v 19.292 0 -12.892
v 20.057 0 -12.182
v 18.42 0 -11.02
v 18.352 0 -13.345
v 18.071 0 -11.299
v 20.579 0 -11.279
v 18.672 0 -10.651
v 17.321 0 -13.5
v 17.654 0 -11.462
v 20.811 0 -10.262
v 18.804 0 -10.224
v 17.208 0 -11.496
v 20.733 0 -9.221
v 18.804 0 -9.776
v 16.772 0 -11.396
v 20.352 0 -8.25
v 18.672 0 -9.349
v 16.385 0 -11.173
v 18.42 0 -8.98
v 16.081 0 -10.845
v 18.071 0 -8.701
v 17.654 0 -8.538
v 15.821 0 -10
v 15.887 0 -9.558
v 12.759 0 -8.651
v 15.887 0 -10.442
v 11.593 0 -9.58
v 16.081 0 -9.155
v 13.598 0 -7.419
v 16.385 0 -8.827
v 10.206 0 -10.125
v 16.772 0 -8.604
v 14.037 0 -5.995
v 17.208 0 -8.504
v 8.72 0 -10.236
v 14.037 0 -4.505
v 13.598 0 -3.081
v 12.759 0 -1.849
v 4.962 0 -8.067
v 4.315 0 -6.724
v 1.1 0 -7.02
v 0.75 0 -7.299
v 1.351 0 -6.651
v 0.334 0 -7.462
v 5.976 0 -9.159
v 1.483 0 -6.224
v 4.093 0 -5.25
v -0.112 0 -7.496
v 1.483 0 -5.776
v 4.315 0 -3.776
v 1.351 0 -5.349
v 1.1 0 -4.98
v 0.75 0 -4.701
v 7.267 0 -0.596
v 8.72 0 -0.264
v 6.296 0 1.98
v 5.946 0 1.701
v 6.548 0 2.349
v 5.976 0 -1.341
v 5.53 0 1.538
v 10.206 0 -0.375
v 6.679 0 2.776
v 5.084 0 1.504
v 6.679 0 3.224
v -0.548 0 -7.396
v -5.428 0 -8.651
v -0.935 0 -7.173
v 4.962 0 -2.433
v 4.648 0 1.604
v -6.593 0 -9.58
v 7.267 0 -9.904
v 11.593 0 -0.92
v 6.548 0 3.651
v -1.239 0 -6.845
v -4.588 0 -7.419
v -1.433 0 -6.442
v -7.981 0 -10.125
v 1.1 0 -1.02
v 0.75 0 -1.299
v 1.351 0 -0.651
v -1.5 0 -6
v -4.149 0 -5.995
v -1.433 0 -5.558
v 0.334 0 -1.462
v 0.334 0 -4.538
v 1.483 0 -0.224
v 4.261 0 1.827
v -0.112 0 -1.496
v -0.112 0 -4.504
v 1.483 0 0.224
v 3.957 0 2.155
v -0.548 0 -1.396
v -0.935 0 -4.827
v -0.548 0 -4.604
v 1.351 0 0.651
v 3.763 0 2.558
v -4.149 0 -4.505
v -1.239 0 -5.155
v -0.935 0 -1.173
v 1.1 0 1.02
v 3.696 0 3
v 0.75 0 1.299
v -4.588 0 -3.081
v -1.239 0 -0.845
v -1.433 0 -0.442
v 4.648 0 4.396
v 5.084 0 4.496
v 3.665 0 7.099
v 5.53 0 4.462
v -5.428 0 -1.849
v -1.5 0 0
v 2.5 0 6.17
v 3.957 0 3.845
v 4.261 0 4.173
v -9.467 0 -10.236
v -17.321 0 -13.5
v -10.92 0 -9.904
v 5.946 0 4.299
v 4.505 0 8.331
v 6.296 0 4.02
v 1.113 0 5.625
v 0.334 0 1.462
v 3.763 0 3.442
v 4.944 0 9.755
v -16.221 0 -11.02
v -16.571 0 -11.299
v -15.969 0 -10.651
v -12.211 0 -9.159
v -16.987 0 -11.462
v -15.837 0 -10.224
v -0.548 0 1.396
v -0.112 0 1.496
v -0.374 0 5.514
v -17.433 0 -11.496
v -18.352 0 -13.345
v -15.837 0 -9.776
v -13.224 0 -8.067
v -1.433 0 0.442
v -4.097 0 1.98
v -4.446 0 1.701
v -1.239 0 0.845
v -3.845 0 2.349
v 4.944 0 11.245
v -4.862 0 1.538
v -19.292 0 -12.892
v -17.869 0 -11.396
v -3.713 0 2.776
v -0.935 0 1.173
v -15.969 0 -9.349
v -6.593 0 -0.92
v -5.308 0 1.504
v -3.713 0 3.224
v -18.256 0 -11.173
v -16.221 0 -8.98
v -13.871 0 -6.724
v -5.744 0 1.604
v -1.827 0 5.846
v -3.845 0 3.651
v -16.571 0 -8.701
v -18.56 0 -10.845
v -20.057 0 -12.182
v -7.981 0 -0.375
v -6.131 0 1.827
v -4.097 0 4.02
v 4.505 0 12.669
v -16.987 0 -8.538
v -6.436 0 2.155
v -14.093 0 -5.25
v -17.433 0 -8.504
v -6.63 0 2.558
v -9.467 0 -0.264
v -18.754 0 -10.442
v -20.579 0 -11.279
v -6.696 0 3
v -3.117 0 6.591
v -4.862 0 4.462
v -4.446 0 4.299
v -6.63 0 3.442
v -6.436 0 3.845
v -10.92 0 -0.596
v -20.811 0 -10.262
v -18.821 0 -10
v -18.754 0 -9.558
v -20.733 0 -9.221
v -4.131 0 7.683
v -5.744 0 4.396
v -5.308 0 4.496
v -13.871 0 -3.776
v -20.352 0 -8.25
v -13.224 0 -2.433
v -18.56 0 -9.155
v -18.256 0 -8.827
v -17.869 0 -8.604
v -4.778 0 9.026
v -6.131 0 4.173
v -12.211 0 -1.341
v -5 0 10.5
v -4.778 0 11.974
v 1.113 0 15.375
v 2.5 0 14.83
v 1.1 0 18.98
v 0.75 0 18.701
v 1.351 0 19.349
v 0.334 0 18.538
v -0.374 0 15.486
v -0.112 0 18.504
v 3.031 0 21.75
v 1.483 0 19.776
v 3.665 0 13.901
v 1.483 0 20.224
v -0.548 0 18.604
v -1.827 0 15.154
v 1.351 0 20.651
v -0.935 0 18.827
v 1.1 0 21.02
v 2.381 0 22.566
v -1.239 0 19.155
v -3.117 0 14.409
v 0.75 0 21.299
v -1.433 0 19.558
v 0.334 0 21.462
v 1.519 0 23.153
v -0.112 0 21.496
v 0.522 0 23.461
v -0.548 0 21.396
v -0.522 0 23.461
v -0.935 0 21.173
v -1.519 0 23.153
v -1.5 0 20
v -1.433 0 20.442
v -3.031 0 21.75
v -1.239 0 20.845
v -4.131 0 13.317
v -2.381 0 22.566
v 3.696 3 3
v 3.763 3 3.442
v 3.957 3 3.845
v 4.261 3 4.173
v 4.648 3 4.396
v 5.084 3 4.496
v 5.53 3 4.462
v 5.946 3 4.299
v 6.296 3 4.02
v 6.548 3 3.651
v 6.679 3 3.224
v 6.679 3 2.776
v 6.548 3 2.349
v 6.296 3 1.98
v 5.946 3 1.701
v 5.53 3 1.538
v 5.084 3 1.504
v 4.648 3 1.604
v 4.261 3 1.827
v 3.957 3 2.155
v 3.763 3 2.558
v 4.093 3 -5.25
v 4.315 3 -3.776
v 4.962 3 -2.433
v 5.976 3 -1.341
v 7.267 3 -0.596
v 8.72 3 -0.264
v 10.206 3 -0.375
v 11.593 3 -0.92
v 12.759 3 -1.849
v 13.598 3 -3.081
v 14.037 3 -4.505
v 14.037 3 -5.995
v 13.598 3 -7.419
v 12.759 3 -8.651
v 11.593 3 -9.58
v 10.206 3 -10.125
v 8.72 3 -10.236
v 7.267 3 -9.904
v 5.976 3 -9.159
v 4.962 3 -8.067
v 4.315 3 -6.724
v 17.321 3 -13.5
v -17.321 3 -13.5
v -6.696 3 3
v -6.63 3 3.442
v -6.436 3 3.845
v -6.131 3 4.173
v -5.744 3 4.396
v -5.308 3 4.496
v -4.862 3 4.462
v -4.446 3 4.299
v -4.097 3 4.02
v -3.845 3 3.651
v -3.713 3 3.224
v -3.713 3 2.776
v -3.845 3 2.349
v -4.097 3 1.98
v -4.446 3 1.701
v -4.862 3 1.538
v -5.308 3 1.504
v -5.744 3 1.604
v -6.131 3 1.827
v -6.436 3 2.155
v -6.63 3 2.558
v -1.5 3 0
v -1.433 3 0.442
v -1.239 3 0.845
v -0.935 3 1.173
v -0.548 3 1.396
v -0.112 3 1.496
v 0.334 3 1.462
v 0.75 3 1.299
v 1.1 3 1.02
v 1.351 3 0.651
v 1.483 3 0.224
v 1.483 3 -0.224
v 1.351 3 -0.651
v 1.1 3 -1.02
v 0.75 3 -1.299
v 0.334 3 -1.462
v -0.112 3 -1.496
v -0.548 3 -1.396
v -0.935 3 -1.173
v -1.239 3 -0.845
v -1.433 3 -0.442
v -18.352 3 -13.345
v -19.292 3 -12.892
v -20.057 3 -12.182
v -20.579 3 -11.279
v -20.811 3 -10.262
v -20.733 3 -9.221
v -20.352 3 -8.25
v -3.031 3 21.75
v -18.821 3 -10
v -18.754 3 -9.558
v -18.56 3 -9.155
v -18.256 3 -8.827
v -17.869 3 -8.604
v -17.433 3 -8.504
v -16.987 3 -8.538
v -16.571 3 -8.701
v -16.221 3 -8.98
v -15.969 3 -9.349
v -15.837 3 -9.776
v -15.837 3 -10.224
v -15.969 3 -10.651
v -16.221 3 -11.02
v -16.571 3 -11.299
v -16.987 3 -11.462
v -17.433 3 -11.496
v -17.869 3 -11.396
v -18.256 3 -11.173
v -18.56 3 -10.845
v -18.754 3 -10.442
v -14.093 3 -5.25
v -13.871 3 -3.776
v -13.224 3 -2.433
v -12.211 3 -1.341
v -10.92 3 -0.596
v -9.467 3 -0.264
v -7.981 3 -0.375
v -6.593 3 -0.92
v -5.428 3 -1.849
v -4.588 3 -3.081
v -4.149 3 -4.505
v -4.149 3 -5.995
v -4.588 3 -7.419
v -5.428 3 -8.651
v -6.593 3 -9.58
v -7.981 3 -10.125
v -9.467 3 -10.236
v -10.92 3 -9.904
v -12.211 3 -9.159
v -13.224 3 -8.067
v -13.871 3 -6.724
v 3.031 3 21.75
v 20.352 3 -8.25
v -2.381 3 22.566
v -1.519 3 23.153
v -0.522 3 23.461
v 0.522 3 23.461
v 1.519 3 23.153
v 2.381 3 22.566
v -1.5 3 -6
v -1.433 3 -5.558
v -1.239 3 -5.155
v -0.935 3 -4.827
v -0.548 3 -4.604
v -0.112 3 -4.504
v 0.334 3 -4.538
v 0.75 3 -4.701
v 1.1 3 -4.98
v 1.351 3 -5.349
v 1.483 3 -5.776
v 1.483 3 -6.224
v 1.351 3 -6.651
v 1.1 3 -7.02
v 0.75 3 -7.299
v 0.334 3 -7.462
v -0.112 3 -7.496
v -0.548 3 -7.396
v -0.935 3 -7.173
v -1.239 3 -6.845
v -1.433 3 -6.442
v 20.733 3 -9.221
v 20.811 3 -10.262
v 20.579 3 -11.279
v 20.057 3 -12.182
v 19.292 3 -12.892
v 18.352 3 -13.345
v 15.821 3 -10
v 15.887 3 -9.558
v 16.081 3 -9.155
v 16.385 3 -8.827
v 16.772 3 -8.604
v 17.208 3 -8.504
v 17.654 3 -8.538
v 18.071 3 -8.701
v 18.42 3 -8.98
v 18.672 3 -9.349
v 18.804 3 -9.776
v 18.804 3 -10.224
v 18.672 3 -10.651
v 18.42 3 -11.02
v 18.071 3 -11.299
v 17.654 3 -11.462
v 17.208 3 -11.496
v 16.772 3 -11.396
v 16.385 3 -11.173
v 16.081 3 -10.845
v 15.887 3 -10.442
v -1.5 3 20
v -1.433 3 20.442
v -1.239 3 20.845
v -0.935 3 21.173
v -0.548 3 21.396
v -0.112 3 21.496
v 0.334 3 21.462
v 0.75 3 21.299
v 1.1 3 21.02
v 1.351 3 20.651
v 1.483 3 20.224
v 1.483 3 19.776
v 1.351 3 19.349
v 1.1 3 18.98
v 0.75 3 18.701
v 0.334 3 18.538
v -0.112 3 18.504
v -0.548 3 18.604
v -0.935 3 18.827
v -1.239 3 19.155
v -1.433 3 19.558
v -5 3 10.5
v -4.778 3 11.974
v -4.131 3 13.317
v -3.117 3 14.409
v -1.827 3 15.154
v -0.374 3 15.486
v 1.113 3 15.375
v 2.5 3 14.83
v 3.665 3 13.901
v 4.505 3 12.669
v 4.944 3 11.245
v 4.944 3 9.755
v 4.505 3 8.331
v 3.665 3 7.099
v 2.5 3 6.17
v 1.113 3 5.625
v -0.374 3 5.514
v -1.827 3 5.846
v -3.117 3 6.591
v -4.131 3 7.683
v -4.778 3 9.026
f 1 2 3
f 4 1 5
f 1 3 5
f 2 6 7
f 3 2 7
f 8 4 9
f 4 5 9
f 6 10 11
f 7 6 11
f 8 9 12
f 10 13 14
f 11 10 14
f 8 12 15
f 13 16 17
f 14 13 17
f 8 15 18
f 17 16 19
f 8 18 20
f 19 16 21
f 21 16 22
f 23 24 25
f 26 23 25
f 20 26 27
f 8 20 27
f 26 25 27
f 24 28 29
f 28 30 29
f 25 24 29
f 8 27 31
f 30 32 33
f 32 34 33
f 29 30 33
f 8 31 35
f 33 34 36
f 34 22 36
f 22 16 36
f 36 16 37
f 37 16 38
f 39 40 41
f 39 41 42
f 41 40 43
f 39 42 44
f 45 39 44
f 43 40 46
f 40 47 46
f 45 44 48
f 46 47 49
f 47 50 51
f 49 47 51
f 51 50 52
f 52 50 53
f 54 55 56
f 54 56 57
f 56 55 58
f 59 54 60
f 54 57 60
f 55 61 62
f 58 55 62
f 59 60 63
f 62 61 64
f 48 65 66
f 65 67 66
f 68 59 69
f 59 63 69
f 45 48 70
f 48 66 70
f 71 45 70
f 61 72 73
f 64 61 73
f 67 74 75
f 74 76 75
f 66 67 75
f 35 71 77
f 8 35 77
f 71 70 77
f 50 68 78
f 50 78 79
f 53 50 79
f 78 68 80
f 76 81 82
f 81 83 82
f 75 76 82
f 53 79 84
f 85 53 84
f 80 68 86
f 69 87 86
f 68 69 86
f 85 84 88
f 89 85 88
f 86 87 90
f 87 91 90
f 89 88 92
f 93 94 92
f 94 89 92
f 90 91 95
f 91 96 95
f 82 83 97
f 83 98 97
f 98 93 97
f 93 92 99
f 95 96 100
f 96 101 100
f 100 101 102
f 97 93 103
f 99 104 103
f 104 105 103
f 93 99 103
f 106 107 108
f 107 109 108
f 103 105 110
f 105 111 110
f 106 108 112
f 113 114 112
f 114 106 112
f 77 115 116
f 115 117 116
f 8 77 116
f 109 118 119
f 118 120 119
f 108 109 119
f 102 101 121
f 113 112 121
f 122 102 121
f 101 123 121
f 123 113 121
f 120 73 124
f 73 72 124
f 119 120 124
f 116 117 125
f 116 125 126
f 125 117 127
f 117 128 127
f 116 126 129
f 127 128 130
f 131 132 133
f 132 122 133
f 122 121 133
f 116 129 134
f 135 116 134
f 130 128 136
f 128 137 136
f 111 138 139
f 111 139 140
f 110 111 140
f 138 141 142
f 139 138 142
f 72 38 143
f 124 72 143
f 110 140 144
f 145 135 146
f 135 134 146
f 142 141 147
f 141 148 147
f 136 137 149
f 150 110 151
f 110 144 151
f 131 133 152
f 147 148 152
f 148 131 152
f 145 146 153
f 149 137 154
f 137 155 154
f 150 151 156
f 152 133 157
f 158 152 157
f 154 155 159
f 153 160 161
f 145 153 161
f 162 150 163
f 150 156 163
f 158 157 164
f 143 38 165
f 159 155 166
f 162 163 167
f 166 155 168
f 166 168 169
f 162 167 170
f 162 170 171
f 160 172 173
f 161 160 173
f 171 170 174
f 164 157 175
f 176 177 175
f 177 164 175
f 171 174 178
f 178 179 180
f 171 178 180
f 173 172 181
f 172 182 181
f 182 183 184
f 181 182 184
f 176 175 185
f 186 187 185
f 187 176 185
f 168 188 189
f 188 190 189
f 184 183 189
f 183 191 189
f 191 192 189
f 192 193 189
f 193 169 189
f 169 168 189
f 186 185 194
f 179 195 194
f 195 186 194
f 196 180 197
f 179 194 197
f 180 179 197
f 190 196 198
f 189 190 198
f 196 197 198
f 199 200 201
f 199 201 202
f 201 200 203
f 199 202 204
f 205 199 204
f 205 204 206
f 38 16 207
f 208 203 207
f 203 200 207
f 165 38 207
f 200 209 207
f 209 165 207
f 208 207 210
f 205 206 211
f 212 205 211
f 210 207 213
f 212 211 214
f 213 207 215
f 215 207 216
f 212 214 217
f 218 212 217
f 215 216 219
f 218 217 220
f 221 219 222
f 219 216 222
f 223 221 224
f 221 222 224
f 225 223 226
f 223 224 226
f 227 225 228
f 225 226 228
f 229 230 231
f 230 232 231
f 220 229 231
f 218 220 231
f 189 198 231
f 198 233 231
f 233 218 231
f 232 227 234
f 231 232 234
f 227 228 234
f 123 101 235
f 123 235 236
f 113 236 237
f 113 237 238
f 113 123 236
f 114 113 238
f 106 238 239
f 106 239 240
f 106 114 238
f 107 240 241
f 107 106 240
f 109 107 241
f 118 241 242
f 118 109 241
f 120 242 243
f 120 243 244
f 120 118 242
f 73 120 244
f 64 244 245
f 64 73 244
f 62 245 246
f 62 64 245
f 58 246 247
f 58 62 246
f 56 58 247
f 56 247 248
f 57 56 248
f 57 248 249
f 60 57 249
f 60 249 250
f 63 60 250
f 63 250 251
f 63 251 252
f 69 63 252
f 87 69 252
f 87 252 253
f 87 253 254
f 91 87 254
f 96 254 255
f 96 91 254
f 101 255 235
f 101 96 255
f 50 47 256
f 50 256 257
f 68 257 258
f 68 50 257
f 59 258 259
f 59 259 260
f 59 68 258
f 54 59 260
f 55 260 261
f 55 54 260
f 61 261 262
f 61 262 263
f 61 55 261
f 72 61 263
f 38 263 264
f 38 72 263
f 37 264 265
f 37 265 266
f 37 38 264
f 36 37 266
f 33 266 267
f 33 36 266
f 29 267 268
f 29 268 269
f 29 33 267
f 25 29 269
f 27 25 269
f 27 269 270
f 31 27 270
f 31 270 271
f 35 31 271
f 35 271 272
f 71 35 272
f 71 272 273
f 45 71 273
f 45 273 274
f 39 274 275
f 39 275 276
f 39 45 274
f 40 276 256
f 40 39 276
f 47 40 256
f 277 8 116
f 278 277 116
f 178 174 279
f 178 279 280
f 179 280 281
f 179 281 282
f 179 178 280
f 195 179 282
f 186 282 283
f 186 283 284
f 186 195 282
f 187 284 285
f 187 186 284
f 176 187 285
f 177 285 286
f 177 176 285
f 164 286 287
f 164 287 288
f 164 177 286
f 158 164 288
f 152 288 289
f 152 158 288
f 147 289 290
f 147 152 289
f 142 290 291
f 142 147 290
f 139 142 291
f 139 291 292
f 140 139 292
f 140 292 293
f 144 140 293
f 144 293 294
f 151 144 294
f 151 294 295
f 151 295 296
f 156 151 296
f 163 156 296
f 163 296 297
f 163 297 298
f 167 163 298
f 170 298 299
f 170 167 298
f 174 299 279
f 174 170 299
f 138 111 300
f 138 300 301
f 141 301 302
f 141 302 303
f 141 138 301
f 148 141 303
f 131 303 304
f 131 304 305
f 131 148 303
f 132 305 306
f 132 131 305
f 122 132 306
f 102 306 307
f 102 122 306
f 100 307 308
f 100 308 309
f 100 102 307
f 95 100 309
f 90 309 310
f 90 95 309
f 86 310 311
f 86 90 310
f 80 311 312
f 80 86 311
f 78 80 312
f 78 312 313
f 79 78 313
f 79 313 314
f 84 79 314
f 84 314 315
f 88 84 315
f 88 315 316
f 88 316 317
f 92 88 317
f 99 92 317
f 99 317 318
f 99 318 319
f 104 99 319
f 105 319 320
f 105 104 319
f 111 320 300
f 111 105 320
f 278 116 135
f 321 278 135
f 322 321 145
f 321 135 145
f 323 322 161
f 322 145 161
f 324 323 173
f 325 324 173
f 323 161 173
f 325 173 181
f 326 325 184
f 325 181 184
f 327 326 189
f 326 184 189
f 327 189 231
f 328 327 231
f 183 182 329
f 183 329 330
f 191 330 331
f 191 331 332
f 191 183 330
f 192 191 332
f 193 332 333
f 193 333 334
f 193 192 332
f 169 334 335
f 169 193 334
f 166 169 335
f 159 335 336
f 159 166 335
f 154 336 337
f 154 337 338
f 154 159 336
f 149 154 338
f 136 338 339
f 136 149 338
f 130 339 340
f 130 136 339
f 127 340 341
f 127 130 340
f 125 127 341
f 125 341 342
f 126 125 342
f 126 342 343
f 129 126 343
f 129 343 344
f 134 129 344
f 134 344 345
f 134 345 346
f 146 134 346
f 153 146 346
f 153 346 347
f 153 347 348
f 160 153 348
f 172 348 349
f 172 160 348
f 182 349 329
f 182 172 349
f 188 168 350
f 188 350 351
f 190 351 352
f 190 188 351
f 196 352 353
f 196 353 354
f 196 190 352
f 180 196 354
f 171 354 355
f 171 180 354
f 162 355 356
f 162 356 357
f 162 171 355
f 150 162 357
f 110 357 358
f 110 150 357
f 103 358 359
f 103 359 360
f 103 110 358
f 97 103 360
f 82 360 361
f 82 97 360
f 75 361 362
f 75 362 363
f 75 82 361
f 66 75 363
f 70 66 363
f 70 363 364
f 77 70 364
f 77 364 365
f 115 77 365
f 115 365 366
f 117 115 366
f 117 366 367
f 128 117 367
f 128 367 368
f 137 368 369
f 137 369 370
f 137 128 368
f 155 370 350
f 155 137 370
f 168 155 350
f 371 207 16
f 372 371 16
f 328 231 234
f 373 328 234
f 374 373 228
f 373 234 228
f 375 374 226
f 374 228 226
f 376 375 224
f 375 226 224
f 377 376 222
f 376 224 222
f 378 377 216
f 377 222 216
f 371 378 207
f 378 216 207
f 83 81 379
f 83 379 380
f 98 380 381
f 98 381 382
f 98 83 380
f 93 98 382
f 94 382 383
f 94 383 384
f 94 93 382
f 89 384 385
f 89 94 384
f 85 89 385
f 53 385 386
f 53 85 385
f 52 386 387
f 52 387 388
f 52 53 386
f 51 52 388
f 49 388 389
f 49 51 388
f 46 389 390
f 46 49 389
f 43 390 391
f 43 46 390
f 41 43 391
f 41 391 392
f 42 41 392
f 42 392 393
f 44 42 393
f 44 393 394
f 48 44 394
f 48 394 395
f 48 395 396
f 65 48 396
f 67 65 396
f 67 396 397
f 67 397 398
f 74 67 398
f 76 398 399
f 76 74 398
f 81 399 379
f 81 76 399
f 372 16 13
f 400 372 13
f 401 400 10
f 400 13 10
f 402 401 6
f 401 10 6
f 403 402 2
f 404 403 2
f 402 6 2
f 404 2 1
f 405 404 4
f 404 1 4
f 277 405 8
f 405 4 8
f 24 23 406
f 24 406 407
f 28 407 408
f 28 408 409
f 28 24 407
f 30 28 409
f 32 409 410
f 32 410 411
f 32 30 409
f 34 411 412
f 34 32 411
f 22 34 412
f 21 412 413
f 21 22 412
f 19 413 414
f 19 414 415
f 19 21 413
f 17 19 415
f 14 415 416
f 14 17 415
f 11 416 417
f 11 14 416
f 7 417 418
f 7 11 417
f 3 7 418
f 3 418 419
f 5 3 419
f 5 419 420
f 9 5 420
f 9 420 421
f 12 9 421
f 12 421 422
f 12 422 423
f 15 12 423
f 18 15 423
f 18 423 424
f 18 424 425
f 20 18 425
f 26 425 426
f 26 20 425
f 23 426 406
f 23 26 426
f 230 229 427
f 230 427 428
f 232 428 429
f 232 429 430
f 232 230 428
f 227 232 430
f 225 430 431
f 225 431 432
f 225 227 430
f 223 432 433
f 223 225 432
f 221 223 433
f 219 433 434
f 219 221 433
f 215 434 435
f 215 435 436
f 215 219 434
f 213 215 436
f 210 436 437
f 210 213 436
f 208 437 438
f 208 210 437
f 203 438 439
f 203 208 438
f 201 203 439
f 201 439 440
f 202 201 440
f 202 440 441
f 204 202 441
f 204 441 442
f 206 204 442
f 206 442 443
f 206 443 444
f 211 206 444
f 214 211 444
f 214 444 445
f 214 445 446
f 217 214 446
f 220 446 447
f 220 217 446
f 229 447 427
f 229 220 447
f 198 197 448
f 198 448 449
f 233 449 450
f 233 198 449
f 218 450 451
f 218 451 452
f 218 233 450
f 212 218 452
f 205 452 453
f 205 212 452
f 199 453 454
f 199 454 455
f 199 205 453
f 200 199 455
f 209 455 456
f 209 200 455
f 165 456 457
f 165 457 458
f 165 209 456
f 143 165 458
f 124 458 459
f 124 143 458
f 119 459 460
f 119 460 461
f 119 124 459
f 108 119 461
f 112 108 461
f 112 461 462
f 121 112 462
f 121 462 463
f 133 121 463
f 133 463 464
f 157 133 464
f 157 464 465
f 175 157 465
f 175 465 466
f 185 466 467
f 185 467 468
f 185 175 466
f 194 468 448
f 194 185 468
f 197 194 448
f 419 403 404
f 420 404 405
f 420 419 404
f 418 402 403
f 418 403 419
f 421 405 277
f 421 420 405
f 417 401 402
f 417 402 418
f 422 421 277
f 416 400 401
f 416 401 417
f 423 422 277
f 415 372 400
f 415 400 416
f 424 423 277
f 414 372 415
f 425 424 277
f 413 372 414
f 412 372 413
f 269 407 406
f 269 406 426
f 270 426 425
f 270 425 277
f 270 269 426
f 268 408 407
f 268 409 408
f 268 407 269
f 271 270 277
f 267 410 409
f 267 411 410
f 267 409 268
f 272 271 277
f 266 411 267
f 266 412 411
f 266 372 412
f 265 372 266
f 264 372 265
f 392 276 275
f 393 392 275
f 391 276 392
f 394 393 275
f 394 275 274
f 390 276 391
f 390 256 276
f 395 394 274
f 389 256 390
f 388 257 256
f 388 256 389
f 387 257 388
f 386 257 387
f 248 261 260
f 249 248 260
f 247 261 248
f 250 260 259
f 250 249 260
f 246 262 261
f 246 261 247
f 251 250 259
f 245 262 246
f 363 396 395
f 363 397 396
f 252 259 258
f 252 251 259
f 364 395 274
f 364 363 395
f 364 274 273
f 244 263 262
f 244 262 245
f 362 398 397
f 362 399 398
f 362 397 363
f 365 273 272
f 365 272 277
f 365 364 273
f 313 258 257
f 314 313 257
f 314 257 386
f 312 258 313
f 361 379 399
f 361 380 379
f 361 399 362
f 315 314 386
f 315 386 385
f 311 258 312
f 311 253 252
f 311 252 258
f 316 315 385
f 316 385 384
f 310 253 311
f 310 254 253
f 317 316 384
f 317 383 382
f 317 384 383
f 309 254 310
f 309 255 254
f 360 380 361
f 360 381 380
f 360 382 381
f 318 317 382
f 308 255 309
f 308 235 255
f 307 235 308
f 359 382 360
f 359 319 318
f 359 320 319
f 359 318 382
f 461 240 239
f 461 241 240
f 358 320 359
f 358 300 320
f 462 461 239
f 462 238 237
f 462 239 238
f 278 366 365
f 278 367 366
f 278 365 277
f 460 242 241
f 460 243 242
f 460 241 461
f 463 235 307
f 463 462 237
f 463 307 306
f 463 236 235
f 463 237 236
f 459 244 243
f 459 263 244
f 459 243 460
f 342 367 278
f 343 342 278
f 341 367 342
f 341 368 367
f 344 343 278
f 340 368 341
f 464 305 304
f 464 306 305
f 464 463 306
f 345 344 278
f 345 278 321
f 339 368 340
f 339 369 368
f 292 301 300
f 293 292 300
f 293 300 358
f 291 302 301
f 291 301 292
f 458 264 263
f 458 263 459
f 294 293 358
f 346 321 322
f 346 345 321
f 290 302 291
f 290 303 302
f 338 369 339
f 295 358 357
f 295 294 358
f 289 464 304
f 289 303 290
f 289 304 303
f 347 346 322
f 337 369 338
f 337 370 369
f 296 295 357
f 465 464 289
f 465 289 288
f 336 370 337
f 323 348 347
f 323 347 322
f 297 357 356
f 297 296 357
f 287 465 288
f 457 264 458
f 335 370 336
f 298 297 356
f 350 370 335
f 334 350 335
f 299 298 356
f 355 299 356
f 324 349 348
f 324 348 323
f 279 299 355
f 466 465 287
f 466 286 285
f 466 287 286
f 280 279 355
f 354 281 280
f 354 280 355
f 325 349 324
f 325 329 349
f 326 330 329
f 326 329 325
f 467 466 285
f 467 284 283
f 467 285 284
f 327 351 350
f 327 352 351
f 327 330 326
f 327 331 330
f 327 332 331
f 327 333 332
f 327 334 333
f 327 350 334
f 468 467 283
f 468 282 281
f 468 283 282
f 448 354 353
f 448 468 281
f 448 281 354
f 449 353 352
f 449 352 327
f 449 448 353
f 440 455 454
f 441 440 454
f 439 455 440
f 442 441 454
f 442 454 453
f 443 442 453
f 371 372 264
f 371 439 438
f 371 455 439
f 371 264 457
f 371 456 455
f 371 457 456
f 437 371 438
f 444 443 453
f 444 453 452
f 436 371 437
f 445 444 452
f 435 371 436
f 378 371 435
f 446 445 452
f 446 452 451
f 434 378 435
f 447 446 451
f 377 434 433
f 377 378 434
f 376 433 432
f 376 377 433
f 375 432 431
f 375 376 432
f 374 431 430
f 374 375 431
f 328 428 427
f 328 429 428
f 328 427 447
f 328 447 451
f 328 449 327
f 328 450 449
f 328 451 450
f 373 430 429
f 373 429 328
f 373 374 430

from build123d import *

# Parameters (mm, degrees)
SKETCH_1_R      = 1.5
SKETCH_1_R_2    = 5
EXTRUDE_1_DEPTH = 3


with BuildPart() as part:
    # 草图1 → 凸台-拉伸1 (new body)
    with BuildSketch(Plane(origin=(0, 0, 0), x_dir=(-1, 0, 0), z_dir=(0, 1, 0))):
        with BuildLine():
            Line((-3.031088913, 21.75), (-20.351596989, -8.25))
            ThreePointArc((-20.351596989, -8.25), (-20.351596989, -11.75), (-17.320508076, -13.5))
            Line((-17.320508076, -13.5), (17.320508076, -13.5))
            ThreePointArc((17.320508076, -13.5), (20.351596989, -11.75), (20.351596989, -8.25))
            Line((20.351596989, -8.25), (3.031088913, 21.75))
            ThreePointArc((3.031088913, 21.75), (0, 23.5), (-3.031088913, 21.75))
        make_face()
        with Locations((0, 20)):
            Circle(SKETCH_1_R, mode=Mode.SUBTRACT)
        with Locations((17.320508076, -10)):
            Circle(SKETCH_1_R, mode=Mode.SUBTRACT)
        with Locations((-17.320508076, -10)):
            Circle(SKETCH_1_R, mode=Mode.SUBTRACT)
        with Locations((-5.196152423, 3)):
            Circle(SKETCH_1_R, mode=Mode.SUBTRACT)
        Circle(SKETCH_1_R, mode=Mode.SUBTRACT)
        with Locations((0, 10.5)):
            Circle(SKETCH_1_R_2, mode=Mode.SUBTRACT)
        with Locations((9.09326674, -5.25)):
            Circle(SKETCH_1_R_2, mode=Mode.SUBTRACT)
        with Locations((-9.09326674, -5.25)):
            Circle(SKETCH_1_R_2, mode=Mode.SUBTRACT)
        with Locations((0, -6)):
            Circle(SKETCH_1_R, mode=Mode.SUBTRACT)
        with Locations((5.196152423, 3)):
            Circle(SKETCH_1_R, mode=Mode.SUBTRACT)
    extrude(amount=EXTRUDE_1_DEPTH)


solid = part.part
